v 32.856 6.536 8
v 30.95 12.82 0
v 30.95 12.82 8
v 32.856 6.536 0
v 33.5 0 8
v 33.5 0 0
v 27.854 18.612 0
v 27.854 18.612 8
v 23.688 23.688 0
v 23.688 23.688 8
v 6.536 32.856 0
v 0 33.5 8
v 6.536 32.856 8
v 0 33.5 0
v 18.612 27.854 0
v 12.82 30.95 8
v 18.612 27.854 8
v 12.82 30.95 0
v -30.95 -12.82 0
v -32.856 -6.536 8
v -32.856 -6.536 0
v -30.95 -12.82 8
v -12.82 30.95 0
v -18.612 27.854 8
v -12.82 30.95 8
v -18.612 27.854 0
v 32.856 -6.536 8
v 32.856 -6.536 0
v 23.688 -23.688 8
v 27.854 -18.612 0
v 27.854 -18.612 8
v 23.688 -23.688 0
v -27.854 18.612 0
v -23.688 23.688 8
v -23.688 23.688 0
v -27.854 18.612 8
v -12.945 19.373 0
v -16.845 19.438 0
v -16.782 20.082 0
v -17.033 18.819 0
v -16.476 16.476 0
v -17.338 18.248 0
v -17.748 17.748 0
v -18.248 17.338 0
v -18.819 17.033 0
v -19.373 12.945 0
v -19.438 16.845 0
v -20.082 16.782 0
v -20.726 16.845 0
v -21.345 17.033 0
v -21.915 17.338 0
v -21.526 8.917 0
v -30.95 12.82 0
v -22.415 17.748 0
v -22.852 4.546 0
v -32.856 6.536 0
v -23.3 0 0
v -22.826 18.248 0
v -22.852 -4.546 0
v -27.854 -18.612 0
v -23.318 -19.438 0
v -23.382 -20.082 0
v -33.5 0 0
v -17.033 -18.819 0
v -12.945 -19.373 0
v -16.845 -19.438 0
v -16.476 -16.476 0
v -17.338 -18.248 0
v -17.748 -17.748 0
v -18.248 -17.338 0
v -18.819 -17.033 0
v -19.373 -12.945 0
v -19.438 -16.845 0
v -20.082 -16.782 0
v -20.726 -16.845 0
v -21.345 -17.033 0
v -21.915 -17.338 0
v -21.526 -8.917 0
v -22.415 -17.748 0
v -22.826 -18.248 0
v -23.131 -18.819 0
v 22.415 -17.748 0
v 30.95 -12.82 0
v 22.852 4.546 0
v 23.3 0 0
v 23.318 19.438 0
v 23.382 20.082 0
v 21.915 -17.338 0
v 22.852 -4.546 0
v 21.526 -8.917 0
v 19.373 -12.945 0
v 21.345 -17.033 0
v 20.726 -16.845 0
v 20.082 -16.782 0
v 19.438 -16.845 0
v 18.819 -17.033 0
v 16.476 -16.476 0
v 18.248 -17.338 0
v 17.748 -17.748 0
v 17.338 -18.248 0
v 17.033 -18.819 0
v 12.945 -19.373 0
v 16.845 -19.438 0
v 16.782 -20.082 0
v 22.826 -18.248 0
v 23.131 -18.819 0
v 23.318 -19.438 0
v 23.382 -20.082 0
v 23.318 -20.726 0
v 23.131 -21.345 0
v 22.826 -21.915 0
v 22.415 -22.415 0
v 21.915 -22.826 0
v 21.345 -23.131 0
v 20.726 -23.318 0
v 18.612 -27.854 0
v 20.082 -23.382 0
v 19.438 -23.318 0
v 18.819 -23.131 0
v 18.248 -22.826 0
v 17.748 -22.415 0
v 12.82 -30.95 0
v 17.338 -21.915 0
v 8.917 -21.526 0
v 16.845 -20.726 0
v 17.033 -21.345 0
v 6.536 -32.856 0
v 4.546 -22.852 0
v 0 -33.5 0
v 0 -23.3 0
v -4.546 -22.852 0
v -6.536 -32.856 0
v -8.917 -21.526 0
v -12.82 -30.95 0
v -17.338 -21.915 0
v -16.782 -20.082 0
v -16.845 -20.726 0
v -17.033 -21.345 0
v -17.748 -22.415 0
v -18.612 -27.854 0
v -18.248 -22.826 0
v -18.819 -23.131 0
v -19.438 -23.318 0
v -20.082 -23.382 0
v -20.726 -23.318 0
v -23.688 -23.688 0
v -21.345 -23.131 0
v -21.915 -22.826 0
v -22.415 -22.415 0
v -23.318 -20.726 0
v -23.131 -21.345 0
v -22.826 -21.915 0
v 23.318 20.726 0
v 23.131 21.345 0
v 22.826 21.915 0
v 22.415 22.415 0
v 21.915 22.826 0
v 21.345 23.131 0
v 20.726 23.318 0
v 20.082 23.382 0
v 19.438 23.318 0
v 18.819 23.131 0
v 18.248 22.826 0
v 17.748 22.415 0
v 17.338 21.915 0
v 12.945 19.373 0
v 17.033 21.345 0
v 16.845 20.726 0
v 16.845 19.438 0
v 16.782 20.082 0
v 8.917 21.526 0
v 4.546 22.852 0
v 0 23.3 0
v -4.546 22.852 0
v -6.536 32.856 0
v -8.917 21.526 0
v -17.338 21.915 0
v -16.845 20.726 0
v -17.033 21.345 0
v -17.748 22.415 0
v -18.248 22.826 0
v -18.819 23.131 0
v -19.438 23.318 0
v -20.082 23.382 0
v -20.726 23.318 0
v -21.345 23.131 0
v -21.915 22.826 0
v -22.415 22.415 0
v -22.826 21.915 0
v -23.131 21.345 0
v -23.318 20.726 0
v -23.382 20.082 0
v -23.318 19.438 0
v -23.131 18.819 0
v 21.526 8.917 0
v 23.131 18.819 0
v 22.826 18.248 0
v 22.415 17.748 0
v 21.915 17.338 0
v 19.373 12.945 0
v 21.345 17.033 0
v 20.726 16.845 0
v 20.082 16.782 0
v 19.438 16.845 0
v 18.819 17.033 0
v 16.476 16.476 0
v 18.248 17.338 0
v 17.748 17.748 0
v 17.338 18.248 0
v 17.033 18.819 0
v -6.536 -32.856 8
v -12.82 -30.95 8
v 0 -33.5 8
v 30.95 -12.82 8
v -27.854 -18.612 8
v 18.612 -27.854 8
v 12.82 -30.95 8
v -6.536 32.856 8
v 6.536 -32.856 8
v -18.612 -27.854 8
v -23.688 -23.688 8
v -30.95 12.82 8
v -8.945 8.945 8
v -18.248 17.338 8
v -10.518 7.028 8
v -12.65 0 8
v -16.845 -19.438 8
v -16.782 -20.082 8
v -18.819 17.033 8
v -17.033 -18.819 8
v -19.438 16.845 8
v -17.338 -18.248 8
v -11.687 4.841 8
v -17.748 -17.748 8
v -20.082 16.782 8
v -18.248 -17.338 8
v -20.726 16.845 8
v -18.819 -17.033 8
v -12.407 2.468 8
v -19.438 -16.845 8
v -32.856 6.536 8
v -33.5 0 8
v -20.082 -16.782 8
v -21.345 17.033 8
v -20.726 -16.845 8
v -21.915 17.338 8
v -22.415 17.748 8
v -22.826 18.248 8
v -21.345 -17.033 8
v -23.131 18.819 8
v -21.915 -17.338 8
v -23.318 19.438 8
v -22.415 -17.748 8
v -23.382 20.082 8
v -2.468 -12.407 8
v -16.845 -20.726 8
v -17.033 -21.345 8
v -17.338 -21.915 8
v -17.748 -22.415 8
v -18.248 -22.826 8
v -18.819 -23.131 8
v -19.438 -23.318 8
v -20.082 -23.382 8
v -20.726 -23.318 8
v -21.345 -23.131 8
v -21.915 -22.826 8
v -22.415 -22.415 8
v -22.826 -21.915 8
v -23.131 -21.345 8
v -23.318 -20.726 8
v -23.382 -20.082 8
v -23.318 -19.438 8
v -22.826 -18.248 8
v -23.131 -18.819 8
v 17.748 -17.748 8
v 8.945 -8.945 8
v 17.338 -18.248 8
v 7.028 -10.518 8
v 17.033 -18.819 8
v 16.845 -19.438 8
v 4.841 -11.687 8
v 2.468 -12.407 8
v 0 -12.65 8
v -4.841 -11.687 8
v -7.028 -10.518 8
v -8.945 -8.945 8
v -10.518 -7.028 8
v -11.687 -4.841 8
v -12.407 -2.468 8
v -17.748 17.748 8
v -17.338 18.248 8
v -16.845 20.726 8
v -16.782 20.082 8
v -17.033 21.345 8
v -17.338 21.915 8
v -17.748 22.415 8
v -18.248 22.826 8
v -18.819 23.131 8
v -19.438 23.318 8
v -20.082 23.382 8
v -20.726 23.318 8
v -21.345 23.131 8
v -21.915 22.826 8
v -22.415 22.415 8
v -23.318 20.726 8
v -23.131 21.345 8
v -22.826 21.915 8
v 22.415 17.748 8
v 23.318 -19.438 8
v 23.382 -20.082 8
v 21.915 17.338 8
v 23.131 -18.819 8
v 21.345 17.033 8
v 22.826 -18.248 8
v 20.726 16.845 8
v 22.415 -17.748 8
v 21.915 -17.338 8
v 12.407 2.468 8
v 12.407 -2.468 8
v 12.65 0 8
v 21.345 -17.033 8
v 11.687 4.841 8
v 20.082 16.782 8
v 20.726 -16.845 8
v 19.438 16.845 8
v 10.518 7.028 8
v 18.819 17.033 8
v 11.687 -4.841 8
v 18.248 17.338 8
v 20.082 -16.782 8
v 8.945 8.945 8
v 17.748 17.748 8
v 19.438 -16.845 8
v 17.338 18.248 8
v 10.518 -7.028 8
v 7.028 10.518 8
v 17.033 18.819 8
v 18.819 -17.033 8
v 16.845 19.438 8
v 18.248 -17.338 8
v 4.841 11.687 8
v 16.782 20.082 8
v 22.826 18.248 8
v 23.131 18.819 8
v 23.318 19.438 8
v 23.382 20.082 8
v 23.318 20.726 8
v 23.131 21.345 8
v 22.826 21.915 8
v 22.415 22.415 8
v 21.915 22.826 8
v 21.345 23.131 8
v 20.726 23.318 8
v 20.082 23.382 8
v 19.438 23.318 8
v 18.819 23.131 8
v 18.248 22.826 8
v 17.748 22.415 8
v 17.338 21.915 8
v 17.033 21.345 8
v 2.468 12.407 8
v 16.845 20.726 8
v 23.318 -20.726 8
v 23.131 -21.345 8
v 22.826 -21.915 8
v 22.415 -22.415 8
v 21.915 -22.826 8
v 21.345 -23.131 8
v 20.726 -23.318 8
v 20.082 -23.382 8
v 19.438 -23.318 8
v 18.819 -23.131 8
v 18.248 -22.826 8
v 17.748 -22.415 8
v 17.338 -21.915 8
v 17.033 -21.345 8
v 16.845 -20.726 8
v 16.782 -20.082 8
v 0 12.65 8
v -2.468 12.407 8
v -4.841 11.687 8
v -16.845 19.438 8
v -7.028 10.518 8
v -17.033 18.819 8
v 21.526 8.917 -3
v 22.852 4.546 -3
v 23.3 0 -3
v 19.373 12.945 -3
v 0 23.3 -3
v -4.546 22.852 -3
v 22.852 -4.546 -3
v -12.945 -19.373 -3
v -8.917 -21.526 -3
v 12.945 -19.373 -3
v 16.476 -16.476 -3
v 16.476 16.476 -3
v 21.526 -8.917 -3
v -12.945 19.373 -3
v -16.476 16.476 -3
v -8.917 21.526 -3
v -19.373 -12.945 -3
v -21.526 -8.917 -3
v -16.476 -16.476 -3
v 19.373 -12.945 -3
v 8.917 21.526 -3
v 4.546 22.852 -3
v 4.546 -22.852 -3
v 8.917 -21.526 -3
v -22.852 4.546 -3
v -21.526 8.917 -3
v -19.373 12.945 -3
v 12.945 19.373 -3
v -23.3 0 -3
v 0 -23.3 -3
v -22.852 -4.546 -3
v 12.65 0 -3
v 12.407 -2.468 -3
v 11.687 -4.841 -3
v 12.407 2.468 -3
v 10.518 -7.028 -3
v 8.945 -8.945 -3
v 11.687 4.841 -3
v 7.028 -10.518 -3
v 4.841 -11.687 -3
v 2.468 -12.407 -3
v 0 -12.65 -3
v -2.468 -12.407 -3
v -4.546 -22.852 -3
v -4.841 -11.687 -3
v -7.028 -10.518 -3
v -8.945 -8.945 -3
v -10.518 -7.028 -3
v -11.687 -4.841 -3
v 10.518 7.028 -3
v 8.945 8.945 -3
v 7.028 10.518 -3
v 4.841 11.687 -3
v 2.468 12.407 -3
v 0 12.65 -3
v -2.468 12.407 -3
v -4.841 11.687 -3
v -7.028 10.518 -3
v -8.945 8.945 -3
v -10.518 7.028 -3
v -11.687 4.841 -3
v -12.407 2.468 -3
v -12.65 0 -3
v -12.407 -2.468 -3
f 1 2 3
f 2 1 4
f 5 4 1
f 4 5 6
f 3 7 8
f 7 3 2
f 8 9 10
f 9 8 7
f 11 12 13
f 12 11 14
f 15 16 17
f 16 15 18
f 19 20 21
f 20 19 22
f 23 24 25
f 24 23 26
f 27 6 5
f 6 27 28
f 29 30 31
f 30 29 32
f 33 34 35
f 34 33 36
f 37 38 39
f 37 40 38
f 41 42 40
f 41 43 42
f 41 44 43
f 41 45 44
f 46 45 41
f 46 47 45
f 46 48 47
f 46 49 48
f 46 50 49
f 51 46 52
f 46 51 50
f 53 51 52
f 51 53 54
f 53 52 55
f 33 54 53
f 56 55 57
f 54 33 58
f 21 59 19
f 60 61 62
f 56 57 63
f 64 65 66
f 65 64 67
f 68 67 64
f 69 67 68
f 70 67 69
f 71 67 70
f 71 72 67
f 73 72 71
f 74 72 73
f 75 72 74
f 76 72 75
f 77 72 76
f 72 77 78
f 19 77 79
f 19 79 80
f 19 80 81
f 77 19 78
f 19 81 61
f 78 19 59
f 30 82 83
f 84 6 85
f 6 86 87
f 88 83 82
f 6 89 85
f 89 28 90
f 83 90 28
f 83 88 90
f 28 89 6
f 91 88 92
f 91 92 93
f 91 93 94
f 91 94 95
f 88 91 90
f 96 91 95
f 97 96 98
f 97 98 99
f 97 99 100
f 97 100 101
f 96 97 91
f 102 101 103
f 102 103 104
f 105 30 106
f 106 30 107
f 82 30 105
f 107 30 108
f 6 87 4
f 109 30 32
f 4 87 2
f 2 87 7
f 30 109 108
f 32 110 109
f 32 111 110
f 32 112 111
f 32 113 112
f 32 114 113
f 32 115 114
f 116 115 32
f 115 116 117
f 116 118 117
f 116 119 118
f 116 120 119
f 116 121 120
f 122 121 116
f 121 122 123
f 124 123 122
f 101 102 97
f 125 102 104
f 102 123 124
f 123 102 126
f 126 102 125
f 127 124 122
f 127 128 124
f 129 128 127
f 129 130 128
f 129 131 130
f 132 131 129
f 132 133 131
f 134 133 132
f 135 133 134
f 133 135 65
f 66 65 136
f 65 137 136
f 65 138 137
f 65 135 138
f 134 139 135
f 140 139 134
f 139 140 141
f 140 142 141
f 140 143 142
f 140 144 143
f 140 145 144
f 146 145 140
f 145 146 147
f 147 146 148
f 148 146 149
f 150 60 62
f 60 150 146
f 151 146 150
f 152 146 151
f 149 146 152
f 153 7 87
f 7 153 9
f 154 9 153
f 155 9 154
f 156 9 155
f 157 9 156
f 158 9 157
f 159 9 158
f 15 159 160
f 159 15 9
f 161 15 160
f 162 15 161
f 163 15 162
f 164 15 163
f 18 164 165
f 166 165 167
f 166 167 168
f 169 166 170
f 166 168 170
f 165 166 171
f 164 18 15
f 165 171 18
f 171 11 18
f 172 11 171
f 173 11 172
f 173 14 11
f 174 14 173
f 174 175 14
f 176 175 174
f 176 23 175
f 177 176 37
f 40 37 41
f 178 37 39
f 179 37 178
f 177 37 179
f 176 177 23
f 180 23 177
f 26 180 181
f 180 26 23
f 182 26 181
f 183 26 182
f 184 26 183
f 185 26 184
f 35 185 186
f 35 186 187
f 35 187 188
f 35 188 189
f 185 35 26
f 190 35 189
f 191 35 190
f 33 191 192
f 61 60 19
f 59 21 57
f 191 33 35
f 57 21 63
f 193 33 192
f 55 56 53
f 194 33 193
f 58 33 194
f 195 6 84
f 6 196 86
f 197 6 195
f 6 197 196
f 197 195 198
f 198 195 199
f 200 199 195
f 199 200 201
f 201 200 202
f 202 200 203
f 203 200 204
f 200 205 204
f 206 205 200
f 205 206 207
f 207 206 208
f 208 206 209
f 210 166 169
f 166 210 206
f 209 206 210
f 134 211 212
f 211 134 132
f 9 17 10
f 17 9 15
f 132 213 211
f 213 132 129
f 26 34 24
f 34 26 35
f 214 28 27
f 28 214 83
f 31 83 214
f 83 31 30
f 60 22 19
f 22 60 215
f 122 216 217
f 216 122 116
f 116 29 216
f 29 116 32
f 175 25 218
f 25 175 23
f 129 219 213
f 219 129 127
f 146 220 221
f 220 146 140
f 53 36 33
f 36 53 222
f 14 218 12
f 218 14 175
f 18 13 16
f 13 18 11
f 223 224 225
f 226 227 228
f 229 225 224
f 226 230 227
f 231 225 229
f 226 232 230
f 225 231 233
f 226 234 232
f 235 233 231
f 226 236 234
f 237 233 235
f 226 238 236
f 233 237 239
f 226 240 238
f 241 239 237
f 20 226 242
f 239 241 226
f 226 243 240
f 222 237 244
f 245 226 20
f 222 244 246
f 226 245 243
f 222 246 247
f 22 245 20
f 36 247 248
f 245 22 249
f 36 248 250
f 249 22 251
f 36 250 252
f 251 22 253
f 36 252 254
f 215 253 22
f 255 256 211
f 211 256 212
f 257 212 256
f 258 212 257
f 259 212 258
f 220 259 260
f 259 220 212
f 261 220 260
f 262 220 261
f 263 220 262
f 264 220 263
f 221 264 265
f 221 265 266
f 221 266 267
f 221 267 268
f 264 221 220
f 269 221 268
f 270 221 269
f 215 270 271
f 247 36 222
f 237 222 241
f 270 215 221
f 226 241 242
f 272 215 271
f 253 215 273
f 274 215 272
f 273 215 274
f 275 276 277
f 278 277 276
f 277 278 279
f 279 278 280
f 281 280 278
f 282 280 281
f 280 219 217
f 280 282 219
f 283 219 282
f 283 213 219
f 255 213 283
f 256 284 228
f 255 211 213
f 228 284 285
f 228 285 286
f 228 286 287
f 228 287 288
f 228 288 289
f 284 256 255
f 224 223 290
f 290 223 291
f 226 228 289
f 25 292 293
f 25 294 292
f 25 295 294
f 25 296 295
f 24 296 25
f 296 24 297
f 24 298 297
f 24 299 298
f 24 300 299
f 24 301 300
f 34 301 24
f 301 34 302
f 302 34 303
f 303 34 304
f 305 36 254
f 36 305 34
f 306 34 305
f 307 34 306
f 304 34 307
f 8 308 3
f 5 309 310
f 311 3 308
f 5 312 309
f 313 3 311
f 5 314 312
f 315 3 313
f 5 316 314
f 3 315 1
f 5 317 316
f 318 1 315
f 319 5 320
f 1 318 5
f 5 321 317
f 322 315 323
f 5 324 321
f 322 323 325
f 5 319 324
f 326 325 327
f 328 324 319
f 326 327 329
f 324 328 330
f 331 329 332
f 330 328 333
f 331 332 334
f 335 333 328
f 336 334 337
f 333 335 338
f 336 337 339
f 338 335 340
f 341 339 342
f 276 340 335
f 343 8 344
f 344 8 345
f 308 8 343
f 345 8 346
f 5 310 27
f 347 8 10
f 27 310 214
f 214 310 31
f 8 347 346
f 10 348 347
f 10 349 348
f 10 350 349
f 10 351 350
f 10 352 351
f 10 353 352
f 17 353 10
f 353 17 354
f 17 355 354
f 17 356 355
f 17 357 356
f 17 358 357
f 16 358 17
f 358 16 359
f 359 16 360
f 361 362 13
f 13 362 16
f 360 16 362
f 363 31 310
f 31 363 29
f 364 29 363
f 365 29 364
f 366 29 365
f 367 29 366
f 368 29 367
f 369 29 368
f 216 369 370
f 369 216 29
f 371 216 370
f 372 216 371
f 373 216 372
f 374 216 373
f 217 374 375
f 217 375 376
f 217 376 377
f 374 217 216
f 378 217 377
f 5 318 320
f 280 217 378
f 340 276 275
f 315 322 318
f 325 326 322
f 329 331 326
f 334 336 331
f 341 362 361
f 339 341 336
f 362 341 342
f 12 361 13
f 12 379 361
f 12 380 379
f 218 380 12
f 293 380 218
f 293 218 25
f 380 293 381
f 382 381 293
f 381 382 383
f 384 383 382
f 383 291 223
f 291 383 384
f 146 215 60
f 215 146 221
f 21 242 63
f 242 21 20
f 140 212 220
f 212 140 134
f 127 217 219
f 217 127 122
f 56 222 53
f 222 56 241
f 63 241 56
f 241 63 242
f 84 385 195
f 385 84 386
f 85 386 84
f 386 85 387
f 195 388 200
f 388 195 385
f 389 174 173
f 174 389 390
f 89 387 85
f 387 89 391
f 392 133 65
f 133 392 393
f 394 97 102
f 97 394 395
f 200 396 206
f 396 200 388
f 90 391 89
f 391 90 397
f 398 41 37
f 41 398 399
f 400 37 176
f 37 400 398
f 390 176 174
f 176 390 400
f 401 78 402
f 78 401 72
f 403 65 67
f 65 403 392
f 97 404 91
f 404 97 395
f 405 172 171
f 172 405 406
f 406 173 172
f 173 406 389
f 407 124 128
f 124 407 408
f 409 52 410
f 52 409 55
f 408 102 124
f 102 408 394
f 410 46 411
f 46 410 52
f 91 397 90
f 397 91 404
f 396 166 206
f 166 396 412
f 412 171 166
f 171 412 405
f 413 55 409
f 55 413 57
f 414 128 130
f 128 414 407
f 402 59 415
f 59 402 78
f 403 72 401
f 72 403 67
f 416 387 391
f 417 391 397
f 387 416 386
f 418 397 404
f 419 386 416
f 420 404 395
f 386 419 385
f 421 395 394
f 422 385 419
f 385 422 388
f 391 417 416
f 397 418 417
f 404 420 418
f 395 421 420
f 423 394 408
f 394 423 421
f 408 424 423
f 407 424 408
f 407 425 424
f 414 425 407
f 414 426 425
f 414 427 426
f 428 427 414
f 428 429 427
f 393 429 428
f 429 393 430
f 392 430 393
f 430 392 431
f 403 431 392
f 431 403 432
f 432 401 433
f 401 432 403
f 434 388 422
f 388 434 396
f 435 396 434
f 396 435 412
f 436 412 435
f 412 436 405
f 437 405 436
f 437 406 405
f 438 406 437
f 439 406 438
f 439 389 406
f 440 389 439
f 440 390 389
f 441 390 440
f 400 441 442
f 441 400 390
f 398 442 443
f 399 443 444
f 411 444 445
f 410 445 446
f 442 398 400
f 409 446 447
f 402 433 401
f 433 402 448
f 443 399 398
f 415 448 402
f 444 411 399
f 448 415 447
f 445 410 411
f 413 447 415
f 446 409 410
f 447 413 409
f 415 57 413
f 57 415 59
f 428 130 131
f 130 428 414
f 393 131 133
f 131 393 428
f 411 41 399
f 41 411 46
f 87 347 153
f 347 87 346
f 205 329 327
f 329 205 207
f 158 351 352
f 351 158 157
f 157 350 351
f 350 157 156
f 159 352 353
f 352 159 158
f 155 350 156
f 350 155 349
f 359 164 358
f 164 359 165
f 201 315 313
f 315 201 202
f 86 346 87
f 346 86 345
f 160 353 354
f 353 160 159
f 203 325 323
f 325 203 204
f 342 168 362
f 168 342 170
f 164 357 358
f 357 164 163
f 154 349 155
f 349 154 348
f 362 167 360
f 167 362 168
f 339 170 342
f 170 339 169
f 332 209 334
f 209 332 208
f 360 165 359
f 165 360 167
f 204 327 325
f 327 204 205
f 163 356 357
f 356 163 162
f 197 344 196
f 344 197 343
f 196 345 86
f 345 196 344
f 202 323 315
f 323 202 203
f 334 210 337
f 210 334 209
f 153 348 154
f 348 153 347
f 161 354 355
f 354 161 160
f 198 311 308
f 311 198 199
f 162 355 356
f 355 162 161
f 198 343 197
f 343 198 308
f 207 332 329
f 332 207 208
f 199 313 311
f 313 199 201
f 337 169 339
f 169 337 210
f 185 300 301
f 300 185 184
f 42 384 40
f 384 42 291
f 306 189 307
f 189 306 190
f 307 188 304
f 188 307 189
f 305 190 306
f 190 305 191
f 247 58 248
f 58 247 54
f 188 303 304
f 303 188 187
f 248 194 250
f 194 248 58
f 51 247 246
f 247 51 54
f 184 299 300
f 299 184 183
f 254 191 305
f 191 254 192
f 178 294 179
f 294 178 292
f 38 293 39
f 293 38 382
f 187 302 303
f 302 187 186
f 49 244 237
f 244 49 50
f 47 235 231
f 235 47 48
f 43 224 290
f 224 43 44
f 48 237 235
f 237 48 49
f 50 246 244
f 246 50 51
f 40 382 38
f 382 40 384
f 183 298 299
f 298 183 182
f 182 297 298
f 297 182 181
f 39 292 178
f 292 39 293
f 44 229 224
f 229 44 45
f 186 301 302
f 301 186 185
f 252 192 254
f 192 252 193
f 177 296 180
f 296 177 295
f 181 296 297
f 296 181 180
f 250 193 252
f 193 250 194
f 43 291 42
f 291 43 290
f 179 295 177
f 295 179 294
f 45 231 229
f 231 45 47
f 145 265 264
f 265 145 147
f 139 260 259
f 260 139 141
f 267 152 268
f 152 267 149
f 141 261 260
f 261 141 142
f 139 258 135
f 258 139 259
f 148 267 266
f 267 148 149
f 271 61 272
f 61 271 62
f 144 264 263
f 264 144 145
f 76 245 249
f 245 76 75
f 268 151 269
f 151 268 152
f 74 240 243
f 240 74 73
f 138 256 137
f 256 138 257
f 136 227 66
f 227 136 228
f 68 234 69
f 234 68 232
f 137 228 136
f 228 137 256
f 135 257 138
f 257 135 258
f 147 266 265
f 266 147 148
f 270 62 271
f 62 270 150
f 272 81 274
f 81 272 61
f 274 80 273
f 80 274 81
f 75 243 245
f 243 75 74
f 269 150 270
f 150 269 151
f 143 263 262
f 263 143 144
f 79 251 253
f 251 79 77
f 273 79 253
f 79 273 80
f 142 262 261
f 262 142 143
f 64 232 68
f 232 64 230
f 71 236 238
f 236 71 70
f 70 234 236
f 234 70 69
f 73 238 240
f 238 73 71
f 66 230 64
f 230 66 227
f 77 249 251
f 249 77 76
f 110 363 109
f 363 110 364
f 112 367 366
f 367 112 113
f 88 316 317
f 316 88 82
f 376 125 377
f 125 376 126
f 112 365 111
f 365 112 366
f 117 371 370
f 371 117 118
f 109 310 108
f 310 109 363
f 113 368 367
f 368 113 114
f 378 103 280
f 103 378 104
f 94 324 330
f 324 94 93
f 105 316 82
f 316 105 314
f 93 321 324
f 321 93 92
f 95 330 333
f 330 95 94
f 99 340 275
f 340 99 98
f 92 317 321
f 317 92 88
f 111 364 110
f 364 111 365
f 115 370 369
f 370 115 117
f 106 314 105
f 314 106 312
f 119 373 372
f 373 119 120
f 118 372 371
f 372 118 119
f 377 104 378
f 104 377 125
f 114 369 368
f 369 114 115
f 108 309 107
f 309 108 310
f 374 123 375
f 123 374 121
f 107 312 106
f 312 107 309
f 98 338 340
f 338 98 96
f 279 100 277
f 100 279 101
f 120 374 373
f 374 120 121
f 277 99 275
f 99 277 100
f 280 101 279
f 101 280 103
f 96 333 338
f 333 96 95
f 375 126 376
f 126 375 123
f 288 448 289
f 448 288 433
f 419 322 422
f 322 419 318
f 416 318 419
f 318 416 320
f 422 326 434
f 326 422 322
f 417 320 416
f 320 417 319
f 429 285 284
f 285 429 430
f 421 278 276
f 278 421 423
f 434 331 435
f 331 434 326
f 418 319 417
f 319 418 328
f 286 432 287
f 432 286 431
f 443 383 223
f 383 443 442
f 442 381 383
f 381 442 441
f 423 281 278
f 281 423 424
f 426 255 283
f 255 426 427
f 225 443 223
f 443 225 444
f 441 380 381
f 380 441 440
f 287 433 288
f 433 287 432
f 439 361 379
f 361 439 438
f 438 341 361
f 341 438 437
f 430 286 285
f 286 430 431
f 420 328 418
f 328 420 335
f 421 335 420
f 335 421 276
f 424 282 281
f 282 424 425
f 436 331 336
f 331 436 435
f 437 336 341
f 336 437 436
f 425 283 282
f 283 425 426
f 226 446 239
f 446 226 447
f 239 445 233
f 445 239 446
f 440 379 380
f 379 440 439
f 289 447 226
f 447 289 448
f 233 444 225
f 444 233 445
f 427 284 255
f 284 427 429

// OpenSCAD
$fn = 32;

// ----------------------------------------------------------------------
// Retaining cap: 6005 cover, 67 mm, spigot 46.6 mm
// ----------------------------------------------------------------------

// --- parameters (mm) ---
plate_d = 67;             // cover diameter
plate_t = 8;              // cover thickness
boss_d = 46.6;            // spigot that enters the housing
boss_h = 3;               // spigot height
shaft_d = 25.3;           // shaft opening
bolt_d = 6.6;             // bolt clearance
bolt_r = 28.4;            // bolt circle radius

module cover() {
  cylinder(h = plate_t, d = plate_d);
}

module spigot() {
  /* sunk 1 mm into the cover; the spigot sets the overall height */
  translate([0, 0, -boss_h]) cylinder(h = boss_h + 1, d = boss_d);
}

difference() {
  union() {
    cover();
    spigot();
  }
  for (i = [0 : 3]) rotate([0, 0, 45 + i * 90]) translate([bolt_r, 0, -boss_h - 1])
    cylinder(h = boss_h + plate_t + 2, d = bolt_d);
  translate([0, 0, -boss_h - 1]) cylinder(h = boss_h + plate_t + 2, d = shaft_d);
}
